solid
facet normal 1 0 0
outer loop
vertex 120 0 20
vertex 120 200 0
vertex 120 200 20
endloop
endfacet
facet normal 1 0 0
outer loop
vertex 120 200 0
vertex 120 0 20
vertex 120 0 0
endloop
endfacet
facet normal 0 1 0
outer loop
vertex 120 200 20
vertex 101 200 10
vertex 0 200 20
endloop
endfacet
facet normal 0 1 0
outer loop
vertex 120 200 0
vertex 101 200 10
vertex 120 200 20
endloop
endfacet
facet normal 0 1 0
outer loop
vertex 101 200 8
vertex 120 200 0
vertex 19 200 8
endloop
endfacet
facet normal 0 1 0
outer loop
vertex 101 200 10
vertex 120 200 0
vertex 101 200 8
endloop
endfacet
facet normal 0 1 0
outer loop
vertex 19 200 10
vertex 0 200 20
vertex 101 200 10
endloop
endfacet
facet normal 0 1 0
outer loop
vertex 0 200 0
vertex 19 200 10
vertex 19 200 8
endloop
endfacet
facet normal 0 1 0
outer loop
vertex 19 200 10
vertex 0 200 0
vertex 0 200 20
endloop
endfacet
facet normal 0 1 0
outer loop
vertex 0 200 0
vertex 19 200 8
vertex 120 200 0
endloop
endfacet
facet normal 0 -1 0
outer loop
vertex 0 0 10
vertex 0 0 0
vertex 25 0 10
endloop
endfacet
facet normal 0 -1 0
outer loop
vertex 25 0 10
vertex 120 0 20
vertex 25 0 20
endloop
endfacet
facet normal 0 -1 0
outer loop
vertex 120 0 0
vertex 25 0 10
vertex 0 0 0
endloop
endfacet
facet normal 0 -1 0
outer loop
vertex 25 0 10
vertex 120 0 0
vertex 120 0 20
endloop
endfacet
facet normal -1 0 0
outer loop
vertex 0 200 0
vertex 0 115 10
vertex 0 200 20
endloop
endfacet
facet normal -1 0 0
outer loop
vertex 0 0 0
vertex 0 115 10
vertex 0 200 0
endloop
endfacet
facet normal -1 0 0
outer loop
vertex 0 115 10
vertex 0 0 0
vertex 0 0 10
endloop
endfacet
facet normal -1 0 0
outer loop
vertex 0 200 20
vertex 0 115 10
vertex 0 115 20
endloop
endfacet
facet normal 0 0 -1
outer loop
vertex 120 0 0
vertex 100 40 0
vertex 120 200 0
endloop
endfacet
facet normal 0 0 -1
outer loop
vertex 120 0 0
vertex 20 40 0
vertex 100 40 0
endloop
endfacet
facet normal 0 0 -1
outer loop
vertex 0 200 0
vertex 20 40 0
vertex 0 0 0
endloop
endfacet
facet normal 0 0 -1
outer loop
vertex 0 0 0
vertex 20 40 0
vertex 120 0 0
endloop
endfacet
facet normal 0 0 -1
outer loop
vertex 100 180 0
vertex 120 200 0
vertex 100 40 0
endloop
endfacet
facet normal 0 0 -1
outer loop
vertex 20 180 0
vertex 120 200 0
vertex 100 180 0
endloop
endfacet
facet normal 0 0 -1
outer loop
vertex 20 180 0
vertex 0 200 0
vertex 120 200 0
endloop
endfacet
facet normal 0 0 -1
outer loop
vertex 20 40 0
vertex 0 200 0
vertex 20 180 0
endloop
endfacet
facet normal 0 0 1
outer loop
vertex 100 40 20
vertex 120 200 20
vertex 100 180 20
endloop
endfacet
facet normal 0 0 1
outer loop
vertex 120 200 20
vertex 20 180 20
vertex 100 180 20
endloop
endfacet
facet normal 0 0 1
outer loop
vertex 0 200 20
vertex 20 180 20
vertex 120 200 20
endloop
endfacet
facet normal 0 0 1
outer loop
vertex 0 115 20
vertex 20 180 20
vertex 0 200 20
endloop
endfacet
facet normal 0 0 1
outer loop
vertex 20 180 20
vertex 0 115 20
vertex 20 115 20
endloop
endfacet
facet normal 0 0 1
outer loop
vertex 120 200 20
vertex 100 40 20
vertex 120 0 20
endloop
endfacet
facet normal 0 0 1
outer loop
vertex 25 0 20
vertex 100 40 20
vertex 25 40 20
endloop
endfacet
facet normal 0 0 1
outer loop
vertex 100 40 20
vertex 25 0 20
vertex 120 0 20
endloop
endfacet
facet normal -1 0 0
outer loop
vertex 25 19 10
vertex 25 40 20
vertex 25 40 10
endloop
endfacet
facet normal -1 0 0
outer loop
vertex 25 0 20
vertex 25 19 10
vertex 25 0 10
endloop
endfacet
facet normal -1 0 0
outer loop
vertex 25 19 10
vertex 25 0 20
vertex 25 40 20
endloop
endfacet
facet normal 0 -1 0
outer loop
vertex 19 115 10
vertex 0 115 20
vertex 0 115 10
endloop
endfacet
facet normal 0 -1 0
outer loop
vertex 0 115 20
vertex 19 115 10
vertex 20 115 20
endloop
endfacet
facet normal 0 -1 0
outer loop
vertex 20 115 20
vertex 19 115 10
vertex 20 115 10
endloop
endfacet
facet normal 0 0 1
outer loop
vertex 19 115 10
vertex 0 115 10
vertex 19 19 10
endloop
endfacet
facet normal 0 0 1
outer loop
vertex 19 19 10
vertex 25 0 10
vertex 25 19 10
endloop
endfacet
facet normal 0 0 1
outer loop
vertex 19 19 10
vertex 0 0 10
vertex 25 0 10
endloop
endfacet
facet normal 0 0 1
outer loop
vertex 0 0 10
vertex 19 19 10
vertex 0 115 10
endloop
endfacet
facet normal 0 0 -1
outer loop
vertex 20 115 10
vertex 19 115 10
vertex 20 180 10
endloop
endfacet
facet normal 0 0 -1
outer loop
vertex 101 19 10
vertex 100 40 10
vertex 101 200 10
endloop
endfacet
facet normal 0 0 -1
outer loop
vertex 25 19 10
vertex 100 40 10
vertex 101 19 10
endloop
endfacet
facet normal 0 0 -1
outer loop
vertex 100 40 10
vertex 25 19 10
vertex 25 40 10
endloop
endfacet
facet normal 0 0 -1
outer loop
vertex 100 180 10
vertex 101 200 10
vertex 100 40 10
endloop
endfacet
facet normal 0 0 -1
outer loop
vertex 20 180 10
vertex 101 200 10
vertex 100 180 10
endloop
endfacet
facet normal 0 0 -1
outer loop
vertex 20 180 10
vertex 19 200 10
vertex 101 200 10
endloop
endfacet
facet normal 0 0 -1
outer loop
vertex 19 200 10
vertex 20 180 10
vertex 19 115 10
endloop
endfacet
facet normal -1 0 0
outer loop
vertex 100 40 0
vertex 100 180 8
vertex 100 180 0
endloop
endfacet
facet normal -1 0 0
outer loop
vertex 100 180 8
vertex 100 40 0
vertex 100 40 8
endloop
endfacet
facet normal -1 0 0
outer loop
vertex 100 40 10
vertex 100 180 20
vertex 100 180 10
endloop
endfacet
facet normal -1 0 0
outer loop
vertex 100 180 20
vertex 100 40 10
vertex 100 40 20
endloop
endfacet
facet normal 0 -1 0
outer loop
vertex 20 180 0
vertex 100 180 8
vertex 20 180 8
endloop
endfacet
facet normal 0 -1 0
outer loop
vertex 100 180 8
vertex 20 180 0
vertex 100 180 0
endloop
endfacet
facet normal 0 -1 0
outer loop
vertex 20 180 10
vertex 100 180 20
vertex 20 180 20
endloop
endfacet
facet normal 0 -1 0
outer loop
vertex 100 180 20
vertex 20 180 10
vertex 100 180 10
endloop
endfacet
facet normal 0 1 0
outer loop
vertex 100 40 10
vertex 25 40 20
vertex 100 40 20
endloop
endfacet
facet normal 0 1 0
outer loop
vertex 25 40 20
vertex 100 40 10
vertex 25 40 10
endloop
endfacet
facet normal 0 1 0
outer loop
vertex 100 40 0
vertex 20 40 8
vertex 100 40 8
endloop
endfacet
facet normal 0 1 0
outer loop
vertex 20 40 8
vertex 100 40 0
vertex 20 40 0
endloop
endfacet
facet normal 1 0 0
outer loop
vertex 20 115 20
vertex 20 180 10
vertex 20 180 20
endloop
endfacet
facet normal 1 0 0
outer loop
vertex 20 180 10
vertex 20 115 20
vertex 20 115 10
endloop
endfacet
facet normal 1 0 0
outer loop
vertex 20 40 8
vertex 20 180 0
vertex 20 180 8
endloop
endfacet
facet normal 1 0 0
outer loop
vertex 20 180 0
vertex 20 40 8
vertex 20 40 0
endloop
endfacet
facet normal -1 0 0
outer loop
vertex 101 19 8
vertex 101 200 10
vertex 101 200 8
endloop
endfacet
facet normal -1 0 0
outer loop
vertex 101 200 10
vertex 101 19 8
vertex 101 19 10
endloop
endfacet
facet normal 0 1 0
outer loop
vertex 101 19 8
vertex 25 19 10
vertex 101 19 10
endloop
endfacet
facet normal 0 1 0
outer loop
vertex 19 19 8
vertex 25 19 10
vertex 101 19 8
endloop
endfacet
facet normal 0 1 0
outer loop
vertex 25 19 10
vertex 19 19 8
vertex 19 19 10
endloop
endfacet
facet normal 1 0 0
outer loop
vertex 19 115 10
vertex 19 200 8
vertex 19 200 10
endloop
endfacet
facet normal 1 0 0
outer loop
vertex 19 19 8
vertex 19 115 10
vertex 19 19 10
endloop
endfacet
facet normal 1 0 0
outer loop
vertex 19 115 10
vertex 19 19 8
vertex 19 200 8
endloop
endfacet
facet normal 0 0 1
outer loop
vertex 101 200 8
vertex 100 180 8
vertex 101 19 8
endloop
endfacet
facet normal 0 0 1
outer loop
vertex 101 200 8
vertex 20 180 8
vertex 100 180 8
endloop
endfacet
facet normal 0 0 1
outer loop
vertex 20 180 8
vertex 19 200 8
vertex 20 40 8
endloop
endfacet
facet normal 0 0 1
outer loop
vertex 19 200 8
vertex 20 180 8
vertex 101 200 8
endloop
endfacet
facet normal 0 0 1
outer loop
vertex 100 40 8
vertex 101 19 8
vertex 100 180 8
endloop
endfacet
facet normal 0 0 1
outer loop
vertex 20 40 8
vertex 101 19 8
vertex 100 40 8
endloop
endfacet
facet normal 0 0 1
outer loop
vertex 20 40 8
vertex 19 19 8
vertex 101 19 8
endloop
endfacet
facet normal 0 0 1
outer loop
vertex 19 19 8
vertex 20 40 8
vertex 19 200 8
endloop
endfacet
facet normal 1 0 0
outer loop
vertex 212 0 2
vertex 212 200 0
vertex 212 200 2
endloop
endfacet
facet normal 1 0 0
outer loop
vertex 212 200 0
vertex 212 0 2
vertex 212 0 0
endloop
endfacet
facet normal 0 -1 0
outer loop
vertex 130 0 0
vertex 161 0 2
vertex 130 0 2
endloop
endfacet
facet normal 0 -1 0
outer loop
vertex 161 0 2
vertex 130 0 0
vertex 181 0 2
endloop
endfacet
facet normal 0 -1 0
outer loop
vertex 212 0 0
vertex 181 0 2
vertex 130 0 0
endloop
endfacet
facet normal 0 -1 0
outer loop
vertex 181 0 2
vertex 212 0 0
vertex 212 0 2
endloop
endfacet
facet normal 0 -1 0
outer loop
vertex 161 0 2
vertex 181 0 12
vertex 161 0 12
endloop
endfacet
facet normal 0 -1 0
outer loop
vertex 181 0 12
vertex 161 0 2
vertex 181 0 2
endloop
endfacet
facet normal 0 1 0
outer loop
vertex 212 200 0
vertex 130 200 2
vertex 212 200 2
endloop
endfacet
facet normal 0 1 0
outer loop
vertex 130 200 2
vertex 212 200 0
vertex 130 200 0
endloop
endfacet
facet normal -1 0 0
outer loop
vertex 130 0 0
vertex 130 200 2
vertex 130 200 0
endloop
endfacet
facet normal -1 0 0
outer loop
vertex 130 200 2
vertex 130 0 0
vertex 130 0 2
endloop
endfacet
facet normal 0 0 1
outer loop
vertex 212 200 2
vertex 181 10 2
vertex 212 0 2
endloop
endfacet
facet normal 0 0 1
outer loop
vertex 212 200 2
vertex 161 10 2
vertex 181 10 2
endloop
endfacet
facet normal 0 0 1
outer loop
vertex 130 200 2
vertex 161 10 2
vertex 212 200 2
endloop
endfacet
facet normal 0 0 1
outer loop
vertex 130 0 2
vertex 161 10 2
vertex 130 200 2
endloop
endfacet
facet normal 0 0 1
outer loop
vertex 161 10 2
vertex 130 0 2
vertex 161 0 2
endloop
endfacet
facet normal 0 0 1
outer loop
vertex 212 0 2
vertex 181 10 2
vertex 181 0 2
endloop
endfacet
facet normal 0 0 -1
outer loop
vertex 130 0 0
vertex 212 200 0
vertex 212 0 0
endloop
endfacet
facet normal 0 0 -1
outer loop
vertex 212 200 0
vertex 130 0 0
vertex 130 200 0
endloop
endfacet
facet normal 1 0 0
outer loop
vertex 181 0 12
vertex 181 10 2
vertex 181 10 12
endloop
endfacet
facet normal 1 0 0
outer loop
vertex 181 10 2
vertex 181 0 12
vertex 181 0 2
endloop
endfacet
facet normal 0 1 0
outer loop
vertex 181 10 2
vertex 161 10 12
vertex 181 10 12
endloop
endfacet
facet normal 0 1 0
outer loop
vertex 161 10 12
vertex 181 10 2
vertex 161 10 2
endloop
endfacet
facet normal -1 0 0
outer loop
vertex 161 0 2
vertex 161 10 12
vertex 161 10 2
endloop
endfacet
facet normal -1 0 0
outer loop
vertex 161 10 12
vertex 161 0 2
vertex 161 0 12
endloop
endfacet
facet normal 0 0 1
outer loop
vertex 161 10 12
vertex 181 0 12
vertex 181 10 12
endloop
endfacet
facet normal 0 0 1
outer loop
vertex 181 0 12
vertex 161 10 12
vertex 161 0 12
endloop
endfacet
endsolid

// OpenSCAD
BoxD=20;
BoxW=120;
BoxH=200;
cutH=BoxH-85;
cutW=25;
cutD=10;
Edge=20;
xOpen=BoxW-Edge*2;
zOpen=BoxH-Edge*2;
xLid=xOpen+2;
yLid=2;
zLid=zOpen+2;


translate([0,0,BoxD]) rotate([-90,0,0]) difference()
{
  cube([BoxW,BoxD,BoxH]);
  translate([-5,-5,-5]) cube([cutW+5,cutD+5,cutH+5]);
  translate([Edge,-5,Edge*2]) cube([xOpen,BoxD+15,BoxH-Edge*3]);
  translate([Edge-1,BoxD/2,Edge-1]) cube([xLid,yLid,BoxH+5]);
}

translate([0,BoxH,0]) rotate([90,0,0])
{
  translate([BoxW+10,0,0]) cube([xLid,yLid,BoxH]);
  translate([BoxW+(xLid/2),yLid,BoxH-10])cube([20,10,10]);
}
